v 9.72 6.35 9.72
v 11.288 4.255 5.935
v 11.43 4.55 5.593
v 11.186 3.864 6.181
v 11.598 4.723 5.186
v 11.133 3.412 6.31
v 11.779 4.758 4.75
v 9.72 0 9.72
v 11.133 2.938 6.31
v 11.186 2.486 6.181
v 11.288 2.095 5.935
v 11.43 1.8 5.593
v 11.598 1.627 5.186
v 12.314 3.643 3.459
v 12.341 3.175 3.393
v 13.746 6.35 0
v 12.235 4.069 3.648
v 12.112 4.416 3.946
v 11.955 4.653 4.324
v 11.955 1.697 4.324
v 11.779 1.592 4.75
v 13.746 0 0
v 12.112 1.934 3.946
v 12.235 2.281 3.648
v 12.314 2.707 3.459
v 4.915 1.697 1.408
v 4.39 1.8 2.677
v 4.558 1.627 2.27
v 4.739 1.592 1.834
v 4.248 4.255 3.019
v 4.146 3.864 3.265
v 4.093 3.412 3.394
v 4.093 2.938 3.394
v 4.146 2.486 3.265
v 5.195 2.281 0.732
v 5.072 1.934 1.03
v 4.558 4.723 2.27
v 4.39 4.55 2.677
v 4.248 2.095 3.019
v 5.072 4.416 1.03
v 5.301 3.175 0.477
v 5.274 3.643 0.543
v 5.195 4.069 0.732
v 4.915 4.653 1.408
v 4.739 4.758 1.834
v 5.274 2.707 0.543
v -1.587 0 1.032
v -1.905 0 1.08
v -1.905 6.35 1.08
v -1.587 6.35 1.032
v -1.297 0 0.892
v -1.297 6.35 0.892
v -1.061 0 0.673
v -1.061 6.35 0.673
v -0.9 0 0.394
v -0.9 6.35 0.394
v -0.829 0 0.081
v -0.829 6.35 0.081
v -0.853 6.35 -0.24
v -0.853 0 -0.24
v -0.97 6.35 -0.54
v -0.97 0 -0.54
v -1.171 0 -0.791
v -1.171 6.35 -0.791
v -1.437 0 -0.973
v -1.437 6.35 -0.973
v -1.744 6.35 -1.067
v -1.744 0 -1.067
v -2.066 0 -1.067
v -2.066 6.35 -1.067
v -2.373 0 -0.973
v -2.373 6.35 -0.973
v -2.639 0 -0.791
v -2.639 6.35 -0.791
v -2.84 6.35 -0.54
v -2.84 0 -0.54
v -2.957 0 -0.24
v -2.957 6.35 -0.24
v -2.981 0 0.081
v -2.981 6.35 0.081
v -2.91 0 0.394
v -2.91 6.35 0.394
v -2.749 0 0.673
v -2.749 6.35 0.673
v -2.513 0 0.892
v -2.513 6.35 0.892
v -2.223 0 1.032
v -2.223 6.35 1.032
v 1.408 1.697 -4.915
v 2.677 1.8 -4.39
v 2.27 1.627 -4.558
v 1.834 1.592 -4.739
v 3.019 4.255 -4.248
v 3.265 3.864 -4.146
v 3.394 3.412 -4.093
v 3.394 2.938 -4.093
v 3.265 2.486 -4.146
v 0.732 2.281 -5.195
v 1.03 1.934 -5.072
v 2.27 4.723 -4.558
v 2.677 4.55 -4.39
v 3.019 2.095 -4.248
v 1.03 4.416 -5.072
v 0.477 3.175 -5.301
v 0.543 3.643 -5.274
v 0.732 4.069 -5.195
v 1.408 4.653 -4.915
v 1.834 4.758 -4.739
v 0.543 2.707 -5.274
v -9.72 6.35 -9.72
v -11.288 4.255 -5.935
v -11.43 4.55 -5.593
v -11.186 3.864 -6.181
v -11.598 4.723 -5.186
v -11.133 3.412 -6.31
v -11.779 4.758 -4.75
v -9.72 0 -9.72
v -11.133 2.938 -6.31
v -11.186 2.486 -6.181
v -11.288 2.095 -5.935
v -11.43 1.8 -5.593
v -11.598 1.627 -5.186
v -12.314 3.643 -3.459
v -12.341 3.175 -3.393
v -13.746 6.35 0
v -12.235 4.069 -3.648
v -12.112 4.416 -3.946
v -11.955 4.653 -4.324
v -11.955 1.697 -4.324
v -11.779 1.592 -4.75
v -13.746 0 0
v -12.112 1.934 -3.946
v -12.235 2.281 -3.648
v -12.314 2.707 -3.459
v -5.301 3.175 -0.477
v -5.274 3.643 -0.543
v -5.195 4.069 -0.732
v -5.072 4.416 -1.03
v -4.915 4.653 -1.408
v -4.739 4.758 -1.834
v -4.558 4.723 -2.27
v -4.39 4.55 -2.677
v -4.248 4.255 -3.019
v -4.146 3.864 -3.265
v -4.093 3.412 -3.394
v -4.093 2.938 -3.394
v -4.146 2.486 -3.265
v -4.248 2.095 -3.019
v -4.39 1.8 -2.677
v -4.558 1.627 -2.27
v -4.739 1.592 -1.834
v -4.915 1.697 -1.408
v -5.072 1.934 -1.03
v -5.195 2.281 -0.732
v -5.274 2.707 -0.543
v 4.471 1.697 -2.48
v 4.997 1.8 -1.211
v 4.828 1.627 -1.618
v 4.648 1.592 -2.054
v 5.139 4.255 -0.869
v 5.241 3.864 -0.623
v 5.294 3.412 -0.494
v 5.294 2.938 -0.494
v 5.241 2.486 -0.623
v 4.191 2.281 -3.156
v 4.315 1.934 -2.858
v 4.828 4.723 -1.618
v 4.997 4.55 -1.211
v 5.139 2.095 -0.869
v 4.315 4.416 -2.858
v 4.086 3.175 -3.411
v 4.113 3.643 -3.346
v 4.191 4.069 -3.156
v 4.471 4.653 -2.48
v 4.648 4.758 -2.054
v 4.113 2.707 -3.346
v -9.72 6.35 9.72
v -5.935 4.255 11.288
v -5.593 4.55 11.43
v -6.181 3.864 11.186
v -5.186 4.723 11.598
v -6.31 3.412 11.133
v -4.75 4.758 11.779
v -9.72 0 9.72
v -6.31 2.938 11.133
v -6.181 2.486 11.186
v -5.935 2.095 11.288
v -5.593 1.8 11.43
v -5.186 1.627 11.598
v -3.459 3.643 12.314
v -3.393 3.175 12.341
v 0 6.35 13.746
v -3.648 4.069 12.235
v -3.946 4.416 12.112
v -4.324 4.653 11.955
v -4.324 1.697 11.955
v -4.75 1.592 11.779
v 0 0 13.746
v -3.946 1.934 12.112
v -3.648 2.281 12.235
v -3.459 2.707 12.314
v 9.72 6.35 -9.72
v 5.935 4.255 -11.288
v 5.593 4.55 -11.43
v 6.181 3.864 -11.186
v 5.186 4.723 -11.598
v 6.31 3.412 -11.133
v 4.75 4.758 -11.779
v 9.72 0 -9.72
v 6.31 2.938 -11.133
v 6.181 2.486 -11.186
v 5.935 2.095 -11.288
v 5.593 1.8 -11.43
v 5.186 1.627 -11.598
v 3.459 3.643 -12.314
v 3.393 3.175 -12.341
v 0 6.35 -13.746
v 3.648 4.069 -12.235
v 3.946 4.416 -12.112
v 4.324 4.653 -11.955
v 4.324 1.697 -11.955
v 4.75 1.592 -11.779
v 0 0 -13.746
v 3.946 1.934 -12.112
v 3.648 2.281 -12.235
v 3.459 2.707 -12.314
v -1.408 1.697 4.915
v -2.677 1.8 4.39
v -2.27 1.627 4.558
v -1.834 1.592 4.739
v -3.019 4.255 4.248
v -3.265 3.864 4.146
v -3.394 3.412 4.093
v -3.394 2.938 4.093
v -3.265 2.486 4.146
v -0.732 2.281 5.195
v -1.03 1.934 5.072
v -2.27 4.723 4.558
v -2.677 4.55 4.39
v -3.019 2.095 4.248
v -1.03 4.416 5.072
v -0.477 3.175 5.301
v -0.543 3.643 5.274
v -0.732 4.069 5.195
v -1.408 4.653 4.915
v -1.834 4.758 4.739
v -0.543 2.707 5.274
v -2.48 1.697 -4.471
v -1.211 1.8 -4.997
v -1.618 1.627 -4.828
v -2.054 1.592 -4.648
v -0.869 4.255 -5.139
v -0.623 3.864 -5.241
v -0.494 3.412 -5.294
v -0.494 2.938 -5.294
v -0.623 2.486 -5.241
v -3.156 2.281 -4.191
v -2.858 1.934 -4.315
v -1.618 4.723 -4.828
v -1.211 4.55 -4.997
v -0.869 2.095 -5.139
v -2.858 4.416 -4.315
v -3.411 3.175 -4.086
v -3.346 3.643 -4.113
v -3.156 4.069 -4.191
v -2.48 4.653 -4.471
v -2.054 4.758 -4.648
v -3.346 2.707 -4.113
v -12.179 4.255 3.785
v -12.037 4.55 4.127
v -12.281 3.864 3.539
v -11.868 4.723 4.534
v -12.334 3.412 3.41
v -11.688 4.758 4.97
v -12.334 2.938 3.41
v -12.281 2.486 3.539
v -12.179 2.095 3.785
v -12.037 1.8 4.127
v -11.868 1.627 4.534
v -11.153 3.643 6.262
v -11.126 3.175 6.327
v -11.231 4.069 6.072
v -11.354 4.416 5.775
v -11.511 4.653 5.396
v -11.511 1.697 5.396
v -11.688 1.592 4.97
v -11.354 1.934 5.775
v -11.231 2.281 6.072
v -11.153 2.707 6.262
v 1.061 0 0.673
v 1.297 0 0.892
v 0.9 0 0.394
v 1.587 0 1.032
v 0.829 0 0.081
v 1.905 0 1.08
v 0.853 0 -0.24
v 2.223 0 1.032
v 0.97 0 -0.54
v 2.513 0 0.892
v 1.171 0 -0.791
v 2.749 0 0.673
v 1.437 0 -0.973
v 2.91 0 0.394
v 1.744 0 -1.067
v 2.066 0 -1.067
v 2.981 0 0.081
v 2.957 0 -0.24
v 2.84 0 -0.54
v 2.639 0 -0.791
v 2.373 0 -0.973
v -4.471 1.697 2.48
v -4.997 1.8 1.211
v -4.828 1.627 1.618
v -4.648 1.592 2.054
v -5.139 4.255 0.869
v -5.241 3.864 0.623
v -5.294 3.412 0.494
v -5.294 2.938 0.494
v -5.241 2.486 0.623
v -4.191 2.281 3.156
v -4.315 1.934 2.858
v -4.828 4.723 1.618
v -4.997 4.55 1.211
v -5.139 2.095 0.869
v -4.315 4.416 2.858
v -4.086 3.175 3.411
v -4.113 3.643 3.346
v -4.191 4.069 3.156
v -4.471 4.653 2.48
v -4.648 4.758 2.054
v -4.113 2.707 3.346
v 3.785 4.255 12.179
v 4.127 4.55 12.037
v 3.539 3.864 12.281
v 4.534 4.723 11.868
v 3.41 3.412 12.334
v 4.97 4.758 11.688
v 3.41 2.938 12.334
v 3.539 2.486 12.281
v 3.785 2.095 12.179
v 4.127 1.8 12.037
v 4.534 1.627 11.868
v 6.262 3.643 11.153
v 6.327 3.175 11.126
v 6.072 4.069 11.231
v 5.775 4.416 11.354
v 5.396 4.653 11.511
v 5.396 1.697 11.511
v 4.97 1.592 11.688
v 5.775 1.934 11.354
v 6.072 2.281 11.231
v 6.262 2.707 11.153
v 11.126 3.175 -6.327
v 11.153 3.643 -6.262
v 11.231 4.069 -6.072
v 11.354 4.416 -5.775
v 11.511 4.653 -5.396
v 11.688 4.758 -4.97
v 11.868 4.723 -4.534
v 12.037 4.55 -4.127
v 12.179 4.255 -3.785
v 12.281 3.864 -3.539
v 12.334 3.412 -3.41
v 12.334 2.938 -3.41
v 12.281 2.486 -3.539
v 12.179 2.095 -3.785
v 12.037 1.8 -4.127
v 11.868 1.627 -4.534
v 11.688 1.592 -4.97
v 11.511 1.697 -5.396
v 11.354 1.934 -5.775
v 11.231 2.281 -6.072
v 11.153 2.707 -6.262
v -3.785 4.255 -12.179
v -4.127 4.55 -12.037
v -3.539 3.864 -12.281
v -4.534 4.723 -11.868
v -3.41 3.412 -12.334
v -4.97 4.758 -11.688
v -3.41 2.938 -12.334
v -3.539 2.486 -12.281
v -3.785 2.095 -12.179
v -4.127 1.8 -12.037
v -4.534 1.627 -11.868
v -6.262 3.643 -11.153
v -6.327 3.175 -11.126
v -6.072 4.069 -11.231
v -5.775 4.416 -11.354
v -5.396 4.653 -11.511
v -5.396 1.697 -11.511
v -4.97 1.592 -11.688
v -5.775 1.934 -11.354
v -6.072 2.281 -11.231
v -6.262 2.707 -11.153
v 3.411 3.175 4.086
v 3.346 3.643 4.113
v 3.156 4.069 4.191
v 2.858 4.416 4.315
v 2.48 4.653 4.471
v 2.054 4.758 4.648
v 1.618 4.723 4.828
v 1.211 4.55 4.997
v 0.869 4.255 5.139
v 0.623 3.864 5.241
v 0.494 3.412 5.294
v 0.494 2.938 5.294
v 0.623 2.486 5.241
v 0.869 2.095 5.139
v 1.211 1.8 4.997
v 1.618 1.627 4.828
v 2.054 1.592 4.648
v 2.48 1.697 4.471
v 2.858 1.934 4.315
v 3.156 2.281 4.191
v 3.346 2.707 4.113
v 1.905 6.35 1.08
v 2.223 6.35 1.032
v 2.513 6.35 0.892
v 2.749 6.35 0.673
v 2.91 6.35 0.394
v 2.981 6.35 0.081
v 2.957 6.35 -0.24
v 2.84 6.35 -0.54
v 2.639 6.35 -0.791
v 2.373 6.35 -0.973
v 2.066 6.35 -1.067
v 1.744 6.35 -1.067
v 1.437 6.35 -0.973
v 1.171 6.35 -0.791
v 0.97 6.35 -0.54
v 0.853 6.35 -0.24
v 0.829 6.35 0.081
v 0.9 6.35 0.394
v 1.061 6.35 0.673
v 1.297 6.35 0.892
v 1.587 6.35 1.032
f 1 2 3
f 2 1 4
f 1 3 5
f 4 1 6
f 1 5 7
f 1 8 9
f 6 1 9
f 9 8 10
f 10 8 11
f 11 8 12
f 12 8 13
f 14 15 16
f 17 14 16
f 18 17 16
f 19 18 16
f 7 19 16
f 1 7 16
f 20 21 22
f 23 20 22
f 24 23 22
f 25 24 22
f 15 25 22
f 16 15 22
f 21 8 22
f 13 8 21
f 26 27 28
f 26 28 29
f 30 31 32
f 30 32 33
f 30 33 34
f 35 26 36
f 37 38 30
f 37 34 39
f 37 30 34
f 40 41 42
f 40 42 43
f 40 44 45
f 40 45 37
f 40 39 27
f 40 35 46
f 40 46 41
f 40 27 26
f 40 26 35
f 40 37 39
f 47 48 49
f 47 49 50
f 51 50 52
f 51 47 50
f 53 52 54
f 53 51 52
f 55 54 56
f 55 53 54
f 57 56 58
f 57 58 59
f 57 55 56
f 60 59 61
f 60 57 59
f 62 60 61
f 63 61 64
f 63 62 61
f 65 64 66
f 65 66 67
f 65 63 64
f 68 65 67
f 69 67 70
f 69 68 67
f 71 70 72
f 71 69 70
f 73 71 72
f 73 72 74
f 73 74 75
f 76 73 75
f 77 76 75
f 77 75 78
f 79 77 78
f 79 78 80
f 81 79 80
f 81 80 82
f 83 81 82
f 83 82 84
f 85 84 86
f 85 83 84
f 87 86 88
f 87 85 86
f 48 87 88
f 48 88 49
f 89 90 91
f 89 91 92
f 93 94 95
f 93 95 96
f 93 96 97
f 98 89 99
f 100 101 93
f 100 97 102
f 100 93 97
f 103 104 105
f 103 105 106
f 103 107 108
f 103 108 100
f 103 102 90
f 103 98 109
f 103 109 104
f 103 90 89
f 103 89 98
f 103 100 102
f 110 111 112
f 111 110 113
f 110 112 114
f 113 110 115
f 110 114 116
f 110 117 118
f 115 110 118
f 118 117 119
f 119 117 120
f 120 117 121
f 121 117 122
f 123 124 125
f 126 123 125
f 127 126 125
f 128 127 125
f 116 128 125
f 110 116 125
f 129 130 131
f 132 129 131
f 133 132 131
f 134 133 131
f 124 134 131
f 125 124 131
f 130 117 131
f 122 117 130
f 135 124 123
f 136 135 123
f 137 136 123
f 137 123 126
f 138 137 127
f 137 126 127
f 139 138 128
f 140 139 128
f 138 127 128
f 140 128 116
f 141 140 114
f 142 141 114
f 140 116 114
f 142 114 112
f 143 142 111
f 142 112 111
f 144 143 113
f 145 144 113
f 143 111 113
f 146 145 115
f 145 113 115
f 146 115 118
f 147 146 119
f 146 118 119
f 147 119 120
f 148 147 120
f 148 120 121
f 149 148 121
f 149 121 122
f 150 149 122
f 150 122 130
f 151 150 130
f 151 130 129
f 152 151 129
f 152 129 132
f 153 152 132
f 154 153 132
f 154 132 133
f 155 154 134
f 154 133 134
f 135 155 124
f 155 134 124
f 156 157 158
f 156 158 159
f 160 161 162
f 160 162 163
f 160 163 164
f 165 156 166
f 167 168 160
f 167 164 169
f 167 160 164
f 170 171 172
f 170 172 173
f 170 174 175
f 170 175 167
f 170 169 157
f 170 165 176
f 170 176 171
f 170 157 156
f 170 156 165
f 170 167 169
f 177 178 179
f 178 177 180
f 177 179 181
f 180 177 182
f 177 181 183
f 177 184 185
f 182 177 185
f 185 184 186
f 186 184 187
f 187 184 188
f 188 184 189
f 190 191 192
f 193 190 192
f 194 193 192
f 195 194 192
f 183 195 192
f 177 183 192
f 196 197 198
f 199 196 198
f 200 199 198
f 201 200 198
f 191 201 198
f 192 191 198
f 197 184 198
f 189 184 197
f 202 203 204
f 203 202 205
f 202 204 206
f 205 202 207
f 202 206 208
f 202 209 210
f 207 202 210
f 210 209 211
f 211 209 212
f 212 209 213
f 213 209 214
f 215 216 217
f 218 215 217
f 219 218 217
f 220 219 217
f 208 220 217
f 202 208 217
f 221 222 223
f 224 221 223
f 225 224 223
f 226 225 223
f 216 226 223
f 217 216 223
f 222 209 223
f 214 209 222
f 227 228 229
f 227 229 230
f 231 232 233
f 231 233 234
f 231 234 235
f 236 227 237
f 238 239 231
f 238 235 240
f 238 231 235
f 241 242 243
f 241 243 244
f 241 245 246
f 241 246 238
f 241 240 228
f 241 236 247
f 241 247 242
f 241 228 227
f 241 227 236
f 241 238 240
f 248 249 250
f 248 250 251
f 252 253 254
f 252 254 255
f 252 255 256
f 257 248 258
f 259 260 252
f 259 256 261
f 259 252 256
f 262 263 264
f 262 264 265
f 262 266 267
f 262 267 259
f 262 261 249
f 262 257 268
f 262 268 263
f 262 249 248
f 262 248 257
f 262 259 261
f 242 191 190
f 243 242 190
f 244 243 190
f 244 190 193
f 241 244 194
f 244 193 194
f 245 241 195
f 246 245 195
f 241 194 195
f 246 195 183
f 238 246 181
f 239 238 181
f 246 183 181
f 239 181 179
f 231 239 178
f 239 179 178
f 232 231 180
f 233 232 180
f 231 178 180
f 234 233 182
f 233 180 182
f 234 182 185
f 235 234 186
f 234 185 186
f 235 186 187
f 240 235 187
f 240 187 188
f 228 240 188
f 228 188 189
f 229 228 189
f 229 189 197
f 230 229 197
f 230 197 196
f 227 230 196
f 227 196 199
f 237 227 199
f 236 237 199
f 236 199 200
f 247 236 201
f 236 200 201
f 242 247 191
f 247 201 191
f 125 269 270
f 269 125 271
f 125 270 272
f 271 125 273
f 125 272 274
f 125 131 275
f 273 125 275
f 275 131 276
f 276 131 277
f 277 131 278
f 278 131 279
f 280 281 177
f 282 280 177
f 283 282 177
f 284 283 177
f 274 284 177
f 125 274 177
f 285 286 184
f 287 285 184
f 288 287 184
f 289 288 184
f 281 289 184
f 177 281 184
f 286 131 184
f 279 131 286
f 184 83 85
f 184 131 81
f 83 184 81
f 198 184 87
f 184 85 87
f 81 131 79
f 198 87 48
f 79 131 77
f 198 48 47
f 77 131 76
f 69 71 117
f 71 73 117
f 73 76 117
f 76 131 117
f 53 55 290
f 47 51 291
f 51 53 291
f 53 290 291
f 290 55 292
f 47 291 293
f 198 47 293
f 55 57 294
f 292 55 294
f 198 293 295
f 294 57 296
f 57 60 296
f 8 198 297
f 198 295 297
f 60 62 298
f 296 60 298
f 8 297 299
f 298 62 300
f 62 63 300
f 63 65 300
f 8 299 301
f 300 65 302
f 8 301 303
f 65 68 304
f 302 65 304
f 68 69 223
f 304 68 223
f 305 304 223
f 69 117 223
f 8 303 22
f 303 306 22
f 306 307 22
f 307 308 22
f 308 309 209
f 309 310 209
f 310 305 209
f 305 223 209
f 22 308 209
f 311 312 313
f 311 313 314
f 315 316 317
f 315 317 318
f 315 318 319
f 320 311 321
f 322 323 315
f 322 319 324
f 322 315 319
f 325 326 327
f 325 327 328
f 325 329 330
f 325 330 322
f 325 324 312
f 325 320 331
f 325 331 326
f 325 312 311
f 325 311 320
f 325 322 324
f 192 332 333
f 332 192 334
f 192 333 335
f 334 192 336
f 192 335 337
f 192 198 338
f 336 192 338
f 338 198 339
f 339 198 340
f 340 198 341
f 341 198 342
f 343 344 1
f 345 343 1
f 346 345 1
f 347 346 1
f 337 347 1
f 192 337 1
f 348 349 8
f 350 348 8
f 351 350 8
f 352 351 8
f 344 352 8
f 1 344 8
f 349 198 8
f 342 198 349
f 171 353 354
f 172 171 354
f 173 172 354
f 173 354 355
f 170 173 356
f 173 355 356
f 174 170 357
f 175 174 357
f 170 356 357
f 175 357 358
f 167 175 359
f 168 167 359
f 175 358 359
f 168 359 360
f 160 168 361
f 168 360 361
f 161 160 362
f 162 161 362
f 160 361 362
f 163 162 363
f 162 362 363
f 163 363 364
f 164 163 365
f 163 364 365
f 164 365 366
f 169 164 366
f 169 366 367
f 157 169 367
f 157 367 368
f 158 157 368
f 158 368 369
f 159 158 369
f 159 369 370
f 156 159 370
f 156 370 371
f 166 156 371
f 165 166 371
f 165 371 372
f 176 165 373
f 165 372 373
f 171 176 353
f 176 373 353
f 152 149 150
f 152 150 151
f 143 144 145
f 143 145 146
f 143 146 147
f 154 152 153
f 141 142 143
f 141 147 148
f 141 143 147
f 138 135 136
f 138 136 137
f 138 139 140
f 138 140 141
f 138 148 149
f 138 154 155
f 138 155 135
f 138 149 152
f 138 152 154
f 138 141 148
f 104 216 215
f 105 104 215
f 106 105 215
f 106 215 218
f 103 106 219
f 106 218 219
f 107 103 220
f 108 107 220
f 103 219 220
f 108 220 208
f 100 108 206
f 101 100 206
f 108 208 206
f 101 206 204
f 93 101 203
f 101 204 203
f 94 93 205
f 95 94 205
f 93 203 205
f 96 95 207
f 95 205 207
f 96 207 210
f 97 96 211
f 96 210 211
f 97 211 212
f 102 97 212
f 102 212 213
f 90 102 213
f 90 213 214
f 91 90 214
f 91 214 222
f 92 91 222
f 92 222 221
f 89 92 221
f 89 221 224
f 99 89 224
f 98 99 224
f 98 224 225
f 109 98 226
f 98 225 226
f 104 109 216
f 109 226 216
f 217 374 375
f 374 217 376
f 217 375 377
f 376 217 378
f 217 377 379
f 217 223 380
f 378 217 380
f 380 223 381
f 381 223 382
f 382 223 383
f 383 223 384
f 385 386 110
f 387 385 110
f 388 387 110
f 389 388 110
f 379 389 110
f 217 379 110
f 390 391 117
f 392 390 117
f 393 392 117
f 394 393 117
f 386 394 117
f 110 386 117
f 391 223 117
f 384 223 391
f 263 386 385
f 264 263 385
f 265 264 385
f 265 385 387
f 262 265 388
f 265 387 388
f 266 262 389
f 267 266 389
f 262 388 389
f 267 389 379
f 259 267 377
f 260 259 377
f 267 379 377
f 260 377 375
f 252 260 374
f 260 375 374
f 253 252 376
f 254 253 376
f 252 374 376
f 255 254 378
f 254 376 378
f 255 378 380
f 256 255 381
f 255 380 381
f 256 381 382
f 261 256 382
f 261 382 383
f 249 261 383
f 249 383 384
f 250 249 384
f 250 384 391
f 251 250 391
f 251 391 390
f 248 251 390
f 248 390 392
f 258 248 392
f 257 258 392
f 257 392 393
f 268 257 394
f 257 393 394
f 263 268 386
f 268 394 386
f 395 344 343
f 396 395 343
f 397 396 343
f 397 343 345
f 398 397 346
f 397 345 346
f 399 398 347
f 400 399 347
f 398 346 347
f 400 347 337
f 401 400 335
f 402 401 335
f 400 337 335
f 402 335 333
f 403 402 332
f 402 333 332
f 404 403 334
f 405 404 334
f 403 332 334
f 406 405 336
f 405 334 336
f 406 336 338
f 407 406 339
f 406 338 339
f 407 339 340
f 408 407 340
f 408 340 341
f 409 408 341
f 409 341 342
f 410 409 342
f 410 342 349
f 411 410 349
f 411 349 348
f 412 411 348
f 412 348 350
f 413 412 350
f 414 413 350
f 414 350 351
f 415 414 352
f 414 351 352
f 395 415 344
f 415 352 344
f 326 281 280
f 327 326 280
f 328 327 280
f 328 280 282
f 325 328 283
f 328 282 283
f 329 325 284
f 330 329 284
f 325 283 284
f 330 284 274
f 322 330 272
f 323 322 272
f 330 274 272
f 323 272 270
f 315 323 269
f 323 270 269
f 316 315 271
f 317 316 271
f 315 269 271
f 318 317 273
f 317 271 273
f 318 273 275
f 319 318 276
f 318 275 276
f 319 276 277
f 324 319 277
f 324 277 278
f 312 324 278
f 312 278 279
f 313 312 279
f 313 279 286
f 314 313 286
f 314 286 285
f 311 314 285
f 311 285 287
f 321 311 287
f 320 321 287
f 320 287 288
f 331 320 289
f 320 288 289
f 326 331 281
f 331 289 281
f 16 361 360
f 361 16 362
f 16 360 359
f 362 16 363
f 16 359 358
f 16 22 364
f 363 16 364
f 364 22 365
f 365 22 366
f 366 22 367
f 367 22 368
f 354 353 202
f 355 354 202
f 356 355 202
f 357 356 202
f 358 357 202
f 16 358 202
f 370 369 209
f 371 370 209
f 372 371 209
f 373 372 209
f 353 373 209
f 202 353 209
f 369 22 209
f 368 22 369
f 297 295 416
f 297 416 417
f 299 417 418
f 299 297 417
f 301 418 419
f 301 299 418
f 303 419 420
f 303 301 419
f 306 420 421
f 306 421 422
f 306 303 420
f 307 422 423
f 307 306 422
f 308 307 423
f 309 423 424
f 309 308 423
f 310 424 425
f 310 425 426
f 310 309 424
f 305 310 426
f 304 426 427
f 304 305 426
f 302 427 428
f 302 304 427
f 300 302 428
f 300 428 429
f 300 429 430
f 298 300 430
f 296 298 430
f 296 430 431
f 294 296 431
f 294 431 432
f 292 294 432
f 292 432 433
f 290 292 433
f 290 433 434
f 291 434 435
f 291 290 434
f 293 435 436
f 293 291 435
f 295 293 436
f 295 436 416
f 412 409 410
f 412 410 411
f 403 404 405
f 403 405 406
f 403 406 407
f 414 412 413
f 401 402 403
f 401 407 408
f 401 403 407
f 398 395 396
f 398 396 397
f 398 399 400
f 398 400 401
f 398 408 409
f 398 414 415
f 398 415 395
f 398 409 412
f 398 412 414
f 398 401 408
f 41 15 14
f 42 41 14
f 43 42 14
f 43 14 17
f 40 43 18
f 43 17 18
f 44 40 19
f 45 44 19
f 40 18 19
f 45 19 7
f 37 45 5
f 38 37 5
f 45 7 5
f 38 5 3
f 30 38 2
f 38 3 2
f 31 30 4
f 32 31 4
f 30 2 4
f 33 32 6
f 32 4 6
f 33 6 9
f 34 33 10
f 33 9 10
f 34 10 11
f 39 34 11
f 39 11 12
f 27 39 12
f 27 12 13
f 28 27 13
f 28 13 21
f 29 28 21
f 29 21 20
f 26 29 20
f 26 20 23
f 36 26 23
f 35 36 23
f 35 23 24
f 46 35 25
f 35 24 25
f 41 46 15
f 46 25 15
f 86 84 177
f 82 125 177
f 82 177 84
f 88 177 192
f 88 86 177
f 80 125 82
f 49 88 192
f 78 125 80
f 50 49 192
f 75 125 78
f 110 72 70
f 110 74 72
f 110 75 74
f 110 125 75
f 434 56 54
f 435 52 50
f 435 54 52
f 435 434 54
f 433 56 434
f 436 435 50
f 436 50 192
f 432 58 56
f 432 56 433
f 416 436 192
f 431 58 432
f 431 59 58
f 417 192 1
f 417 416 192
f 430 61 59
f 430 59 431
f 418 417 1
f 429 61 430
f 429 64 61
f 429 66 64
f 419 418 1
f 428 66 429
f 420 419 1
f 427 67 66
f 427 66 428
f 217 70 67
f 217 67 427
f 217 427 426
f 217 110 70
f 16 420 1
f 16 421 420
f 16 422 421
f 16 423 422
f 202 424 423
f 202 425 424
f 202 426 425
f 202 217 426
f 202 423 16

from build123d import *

# Parameters (mm, degrees)
SKETCH1_R           = 1.0795
BOSS_EXTRUDE1_DEPTH = 6.35
SKETCH2_R           = 1.5875
CUT_EXTRUDE1_DEPTH  = 7.62
CIRPATTERN1_COUNT   = 8


with BuildPart() as part:
    # Sketch1 → Boss-Extrude1 (new body)
    with BuildSketch(Plane(origin=(0, 0, 0), x_dir=(1, 0, 0), z_dir=(0, 1, 0))):
        Polygon((0, 13.746380944), (-9.720159182, 9.720159182), (-13.746380944, 0), (-9.720159182, -9.720159182), (0, -13.746380944), (9.720159182, -9.720159182), (13.746380944, 0), (9.720159182, 9.720159182), align=None)
        with Locations(Location((1.905, 0, 0), (0, 0, 270))):
            Circle(SKETCH1_R, mode=Mode.SUBTRACT)
        with Locations(Location((-1.905, 0, 0), (0, 0, 270))):
            Circle(SKETCH1_R, mode=Mode.SUBTRACT)
    extrude(amount=BOSS_EXTRUDE1_DEPTH)

    # Sketch2 → Cut-Extrude1 (cut)
    with BuildSketch(Plane(origin=(-4.860079591, 0, 11.733270063), x_dir=(0.9238795325112905, 0, 0.3826834323650806), z_dir=(-0.3826834323650806, 0, 0.9238795325112905))):
        with Locations((0, 3.175)):
            Circle(SKETCH2_R)
    cut_extrude1 = extrude(amount=-CUT_EXTRUDE1_DEPTH, mode=Mode.SUBTRACT)

    # CirPattern1: Cut-Extrude1 ×8 about axis
    cirpattern1_axis = Axis((0, 0, 0), (0, 1, 0))
    for i in range(1, CIRPATTERN1_COUNT):
        add(cut_extrude1.rotate(cirpattern1_axis, i * 360 / CIRPATTERN1_COUNT), mode=Mode.SUBTRACT)


solid = part.part
